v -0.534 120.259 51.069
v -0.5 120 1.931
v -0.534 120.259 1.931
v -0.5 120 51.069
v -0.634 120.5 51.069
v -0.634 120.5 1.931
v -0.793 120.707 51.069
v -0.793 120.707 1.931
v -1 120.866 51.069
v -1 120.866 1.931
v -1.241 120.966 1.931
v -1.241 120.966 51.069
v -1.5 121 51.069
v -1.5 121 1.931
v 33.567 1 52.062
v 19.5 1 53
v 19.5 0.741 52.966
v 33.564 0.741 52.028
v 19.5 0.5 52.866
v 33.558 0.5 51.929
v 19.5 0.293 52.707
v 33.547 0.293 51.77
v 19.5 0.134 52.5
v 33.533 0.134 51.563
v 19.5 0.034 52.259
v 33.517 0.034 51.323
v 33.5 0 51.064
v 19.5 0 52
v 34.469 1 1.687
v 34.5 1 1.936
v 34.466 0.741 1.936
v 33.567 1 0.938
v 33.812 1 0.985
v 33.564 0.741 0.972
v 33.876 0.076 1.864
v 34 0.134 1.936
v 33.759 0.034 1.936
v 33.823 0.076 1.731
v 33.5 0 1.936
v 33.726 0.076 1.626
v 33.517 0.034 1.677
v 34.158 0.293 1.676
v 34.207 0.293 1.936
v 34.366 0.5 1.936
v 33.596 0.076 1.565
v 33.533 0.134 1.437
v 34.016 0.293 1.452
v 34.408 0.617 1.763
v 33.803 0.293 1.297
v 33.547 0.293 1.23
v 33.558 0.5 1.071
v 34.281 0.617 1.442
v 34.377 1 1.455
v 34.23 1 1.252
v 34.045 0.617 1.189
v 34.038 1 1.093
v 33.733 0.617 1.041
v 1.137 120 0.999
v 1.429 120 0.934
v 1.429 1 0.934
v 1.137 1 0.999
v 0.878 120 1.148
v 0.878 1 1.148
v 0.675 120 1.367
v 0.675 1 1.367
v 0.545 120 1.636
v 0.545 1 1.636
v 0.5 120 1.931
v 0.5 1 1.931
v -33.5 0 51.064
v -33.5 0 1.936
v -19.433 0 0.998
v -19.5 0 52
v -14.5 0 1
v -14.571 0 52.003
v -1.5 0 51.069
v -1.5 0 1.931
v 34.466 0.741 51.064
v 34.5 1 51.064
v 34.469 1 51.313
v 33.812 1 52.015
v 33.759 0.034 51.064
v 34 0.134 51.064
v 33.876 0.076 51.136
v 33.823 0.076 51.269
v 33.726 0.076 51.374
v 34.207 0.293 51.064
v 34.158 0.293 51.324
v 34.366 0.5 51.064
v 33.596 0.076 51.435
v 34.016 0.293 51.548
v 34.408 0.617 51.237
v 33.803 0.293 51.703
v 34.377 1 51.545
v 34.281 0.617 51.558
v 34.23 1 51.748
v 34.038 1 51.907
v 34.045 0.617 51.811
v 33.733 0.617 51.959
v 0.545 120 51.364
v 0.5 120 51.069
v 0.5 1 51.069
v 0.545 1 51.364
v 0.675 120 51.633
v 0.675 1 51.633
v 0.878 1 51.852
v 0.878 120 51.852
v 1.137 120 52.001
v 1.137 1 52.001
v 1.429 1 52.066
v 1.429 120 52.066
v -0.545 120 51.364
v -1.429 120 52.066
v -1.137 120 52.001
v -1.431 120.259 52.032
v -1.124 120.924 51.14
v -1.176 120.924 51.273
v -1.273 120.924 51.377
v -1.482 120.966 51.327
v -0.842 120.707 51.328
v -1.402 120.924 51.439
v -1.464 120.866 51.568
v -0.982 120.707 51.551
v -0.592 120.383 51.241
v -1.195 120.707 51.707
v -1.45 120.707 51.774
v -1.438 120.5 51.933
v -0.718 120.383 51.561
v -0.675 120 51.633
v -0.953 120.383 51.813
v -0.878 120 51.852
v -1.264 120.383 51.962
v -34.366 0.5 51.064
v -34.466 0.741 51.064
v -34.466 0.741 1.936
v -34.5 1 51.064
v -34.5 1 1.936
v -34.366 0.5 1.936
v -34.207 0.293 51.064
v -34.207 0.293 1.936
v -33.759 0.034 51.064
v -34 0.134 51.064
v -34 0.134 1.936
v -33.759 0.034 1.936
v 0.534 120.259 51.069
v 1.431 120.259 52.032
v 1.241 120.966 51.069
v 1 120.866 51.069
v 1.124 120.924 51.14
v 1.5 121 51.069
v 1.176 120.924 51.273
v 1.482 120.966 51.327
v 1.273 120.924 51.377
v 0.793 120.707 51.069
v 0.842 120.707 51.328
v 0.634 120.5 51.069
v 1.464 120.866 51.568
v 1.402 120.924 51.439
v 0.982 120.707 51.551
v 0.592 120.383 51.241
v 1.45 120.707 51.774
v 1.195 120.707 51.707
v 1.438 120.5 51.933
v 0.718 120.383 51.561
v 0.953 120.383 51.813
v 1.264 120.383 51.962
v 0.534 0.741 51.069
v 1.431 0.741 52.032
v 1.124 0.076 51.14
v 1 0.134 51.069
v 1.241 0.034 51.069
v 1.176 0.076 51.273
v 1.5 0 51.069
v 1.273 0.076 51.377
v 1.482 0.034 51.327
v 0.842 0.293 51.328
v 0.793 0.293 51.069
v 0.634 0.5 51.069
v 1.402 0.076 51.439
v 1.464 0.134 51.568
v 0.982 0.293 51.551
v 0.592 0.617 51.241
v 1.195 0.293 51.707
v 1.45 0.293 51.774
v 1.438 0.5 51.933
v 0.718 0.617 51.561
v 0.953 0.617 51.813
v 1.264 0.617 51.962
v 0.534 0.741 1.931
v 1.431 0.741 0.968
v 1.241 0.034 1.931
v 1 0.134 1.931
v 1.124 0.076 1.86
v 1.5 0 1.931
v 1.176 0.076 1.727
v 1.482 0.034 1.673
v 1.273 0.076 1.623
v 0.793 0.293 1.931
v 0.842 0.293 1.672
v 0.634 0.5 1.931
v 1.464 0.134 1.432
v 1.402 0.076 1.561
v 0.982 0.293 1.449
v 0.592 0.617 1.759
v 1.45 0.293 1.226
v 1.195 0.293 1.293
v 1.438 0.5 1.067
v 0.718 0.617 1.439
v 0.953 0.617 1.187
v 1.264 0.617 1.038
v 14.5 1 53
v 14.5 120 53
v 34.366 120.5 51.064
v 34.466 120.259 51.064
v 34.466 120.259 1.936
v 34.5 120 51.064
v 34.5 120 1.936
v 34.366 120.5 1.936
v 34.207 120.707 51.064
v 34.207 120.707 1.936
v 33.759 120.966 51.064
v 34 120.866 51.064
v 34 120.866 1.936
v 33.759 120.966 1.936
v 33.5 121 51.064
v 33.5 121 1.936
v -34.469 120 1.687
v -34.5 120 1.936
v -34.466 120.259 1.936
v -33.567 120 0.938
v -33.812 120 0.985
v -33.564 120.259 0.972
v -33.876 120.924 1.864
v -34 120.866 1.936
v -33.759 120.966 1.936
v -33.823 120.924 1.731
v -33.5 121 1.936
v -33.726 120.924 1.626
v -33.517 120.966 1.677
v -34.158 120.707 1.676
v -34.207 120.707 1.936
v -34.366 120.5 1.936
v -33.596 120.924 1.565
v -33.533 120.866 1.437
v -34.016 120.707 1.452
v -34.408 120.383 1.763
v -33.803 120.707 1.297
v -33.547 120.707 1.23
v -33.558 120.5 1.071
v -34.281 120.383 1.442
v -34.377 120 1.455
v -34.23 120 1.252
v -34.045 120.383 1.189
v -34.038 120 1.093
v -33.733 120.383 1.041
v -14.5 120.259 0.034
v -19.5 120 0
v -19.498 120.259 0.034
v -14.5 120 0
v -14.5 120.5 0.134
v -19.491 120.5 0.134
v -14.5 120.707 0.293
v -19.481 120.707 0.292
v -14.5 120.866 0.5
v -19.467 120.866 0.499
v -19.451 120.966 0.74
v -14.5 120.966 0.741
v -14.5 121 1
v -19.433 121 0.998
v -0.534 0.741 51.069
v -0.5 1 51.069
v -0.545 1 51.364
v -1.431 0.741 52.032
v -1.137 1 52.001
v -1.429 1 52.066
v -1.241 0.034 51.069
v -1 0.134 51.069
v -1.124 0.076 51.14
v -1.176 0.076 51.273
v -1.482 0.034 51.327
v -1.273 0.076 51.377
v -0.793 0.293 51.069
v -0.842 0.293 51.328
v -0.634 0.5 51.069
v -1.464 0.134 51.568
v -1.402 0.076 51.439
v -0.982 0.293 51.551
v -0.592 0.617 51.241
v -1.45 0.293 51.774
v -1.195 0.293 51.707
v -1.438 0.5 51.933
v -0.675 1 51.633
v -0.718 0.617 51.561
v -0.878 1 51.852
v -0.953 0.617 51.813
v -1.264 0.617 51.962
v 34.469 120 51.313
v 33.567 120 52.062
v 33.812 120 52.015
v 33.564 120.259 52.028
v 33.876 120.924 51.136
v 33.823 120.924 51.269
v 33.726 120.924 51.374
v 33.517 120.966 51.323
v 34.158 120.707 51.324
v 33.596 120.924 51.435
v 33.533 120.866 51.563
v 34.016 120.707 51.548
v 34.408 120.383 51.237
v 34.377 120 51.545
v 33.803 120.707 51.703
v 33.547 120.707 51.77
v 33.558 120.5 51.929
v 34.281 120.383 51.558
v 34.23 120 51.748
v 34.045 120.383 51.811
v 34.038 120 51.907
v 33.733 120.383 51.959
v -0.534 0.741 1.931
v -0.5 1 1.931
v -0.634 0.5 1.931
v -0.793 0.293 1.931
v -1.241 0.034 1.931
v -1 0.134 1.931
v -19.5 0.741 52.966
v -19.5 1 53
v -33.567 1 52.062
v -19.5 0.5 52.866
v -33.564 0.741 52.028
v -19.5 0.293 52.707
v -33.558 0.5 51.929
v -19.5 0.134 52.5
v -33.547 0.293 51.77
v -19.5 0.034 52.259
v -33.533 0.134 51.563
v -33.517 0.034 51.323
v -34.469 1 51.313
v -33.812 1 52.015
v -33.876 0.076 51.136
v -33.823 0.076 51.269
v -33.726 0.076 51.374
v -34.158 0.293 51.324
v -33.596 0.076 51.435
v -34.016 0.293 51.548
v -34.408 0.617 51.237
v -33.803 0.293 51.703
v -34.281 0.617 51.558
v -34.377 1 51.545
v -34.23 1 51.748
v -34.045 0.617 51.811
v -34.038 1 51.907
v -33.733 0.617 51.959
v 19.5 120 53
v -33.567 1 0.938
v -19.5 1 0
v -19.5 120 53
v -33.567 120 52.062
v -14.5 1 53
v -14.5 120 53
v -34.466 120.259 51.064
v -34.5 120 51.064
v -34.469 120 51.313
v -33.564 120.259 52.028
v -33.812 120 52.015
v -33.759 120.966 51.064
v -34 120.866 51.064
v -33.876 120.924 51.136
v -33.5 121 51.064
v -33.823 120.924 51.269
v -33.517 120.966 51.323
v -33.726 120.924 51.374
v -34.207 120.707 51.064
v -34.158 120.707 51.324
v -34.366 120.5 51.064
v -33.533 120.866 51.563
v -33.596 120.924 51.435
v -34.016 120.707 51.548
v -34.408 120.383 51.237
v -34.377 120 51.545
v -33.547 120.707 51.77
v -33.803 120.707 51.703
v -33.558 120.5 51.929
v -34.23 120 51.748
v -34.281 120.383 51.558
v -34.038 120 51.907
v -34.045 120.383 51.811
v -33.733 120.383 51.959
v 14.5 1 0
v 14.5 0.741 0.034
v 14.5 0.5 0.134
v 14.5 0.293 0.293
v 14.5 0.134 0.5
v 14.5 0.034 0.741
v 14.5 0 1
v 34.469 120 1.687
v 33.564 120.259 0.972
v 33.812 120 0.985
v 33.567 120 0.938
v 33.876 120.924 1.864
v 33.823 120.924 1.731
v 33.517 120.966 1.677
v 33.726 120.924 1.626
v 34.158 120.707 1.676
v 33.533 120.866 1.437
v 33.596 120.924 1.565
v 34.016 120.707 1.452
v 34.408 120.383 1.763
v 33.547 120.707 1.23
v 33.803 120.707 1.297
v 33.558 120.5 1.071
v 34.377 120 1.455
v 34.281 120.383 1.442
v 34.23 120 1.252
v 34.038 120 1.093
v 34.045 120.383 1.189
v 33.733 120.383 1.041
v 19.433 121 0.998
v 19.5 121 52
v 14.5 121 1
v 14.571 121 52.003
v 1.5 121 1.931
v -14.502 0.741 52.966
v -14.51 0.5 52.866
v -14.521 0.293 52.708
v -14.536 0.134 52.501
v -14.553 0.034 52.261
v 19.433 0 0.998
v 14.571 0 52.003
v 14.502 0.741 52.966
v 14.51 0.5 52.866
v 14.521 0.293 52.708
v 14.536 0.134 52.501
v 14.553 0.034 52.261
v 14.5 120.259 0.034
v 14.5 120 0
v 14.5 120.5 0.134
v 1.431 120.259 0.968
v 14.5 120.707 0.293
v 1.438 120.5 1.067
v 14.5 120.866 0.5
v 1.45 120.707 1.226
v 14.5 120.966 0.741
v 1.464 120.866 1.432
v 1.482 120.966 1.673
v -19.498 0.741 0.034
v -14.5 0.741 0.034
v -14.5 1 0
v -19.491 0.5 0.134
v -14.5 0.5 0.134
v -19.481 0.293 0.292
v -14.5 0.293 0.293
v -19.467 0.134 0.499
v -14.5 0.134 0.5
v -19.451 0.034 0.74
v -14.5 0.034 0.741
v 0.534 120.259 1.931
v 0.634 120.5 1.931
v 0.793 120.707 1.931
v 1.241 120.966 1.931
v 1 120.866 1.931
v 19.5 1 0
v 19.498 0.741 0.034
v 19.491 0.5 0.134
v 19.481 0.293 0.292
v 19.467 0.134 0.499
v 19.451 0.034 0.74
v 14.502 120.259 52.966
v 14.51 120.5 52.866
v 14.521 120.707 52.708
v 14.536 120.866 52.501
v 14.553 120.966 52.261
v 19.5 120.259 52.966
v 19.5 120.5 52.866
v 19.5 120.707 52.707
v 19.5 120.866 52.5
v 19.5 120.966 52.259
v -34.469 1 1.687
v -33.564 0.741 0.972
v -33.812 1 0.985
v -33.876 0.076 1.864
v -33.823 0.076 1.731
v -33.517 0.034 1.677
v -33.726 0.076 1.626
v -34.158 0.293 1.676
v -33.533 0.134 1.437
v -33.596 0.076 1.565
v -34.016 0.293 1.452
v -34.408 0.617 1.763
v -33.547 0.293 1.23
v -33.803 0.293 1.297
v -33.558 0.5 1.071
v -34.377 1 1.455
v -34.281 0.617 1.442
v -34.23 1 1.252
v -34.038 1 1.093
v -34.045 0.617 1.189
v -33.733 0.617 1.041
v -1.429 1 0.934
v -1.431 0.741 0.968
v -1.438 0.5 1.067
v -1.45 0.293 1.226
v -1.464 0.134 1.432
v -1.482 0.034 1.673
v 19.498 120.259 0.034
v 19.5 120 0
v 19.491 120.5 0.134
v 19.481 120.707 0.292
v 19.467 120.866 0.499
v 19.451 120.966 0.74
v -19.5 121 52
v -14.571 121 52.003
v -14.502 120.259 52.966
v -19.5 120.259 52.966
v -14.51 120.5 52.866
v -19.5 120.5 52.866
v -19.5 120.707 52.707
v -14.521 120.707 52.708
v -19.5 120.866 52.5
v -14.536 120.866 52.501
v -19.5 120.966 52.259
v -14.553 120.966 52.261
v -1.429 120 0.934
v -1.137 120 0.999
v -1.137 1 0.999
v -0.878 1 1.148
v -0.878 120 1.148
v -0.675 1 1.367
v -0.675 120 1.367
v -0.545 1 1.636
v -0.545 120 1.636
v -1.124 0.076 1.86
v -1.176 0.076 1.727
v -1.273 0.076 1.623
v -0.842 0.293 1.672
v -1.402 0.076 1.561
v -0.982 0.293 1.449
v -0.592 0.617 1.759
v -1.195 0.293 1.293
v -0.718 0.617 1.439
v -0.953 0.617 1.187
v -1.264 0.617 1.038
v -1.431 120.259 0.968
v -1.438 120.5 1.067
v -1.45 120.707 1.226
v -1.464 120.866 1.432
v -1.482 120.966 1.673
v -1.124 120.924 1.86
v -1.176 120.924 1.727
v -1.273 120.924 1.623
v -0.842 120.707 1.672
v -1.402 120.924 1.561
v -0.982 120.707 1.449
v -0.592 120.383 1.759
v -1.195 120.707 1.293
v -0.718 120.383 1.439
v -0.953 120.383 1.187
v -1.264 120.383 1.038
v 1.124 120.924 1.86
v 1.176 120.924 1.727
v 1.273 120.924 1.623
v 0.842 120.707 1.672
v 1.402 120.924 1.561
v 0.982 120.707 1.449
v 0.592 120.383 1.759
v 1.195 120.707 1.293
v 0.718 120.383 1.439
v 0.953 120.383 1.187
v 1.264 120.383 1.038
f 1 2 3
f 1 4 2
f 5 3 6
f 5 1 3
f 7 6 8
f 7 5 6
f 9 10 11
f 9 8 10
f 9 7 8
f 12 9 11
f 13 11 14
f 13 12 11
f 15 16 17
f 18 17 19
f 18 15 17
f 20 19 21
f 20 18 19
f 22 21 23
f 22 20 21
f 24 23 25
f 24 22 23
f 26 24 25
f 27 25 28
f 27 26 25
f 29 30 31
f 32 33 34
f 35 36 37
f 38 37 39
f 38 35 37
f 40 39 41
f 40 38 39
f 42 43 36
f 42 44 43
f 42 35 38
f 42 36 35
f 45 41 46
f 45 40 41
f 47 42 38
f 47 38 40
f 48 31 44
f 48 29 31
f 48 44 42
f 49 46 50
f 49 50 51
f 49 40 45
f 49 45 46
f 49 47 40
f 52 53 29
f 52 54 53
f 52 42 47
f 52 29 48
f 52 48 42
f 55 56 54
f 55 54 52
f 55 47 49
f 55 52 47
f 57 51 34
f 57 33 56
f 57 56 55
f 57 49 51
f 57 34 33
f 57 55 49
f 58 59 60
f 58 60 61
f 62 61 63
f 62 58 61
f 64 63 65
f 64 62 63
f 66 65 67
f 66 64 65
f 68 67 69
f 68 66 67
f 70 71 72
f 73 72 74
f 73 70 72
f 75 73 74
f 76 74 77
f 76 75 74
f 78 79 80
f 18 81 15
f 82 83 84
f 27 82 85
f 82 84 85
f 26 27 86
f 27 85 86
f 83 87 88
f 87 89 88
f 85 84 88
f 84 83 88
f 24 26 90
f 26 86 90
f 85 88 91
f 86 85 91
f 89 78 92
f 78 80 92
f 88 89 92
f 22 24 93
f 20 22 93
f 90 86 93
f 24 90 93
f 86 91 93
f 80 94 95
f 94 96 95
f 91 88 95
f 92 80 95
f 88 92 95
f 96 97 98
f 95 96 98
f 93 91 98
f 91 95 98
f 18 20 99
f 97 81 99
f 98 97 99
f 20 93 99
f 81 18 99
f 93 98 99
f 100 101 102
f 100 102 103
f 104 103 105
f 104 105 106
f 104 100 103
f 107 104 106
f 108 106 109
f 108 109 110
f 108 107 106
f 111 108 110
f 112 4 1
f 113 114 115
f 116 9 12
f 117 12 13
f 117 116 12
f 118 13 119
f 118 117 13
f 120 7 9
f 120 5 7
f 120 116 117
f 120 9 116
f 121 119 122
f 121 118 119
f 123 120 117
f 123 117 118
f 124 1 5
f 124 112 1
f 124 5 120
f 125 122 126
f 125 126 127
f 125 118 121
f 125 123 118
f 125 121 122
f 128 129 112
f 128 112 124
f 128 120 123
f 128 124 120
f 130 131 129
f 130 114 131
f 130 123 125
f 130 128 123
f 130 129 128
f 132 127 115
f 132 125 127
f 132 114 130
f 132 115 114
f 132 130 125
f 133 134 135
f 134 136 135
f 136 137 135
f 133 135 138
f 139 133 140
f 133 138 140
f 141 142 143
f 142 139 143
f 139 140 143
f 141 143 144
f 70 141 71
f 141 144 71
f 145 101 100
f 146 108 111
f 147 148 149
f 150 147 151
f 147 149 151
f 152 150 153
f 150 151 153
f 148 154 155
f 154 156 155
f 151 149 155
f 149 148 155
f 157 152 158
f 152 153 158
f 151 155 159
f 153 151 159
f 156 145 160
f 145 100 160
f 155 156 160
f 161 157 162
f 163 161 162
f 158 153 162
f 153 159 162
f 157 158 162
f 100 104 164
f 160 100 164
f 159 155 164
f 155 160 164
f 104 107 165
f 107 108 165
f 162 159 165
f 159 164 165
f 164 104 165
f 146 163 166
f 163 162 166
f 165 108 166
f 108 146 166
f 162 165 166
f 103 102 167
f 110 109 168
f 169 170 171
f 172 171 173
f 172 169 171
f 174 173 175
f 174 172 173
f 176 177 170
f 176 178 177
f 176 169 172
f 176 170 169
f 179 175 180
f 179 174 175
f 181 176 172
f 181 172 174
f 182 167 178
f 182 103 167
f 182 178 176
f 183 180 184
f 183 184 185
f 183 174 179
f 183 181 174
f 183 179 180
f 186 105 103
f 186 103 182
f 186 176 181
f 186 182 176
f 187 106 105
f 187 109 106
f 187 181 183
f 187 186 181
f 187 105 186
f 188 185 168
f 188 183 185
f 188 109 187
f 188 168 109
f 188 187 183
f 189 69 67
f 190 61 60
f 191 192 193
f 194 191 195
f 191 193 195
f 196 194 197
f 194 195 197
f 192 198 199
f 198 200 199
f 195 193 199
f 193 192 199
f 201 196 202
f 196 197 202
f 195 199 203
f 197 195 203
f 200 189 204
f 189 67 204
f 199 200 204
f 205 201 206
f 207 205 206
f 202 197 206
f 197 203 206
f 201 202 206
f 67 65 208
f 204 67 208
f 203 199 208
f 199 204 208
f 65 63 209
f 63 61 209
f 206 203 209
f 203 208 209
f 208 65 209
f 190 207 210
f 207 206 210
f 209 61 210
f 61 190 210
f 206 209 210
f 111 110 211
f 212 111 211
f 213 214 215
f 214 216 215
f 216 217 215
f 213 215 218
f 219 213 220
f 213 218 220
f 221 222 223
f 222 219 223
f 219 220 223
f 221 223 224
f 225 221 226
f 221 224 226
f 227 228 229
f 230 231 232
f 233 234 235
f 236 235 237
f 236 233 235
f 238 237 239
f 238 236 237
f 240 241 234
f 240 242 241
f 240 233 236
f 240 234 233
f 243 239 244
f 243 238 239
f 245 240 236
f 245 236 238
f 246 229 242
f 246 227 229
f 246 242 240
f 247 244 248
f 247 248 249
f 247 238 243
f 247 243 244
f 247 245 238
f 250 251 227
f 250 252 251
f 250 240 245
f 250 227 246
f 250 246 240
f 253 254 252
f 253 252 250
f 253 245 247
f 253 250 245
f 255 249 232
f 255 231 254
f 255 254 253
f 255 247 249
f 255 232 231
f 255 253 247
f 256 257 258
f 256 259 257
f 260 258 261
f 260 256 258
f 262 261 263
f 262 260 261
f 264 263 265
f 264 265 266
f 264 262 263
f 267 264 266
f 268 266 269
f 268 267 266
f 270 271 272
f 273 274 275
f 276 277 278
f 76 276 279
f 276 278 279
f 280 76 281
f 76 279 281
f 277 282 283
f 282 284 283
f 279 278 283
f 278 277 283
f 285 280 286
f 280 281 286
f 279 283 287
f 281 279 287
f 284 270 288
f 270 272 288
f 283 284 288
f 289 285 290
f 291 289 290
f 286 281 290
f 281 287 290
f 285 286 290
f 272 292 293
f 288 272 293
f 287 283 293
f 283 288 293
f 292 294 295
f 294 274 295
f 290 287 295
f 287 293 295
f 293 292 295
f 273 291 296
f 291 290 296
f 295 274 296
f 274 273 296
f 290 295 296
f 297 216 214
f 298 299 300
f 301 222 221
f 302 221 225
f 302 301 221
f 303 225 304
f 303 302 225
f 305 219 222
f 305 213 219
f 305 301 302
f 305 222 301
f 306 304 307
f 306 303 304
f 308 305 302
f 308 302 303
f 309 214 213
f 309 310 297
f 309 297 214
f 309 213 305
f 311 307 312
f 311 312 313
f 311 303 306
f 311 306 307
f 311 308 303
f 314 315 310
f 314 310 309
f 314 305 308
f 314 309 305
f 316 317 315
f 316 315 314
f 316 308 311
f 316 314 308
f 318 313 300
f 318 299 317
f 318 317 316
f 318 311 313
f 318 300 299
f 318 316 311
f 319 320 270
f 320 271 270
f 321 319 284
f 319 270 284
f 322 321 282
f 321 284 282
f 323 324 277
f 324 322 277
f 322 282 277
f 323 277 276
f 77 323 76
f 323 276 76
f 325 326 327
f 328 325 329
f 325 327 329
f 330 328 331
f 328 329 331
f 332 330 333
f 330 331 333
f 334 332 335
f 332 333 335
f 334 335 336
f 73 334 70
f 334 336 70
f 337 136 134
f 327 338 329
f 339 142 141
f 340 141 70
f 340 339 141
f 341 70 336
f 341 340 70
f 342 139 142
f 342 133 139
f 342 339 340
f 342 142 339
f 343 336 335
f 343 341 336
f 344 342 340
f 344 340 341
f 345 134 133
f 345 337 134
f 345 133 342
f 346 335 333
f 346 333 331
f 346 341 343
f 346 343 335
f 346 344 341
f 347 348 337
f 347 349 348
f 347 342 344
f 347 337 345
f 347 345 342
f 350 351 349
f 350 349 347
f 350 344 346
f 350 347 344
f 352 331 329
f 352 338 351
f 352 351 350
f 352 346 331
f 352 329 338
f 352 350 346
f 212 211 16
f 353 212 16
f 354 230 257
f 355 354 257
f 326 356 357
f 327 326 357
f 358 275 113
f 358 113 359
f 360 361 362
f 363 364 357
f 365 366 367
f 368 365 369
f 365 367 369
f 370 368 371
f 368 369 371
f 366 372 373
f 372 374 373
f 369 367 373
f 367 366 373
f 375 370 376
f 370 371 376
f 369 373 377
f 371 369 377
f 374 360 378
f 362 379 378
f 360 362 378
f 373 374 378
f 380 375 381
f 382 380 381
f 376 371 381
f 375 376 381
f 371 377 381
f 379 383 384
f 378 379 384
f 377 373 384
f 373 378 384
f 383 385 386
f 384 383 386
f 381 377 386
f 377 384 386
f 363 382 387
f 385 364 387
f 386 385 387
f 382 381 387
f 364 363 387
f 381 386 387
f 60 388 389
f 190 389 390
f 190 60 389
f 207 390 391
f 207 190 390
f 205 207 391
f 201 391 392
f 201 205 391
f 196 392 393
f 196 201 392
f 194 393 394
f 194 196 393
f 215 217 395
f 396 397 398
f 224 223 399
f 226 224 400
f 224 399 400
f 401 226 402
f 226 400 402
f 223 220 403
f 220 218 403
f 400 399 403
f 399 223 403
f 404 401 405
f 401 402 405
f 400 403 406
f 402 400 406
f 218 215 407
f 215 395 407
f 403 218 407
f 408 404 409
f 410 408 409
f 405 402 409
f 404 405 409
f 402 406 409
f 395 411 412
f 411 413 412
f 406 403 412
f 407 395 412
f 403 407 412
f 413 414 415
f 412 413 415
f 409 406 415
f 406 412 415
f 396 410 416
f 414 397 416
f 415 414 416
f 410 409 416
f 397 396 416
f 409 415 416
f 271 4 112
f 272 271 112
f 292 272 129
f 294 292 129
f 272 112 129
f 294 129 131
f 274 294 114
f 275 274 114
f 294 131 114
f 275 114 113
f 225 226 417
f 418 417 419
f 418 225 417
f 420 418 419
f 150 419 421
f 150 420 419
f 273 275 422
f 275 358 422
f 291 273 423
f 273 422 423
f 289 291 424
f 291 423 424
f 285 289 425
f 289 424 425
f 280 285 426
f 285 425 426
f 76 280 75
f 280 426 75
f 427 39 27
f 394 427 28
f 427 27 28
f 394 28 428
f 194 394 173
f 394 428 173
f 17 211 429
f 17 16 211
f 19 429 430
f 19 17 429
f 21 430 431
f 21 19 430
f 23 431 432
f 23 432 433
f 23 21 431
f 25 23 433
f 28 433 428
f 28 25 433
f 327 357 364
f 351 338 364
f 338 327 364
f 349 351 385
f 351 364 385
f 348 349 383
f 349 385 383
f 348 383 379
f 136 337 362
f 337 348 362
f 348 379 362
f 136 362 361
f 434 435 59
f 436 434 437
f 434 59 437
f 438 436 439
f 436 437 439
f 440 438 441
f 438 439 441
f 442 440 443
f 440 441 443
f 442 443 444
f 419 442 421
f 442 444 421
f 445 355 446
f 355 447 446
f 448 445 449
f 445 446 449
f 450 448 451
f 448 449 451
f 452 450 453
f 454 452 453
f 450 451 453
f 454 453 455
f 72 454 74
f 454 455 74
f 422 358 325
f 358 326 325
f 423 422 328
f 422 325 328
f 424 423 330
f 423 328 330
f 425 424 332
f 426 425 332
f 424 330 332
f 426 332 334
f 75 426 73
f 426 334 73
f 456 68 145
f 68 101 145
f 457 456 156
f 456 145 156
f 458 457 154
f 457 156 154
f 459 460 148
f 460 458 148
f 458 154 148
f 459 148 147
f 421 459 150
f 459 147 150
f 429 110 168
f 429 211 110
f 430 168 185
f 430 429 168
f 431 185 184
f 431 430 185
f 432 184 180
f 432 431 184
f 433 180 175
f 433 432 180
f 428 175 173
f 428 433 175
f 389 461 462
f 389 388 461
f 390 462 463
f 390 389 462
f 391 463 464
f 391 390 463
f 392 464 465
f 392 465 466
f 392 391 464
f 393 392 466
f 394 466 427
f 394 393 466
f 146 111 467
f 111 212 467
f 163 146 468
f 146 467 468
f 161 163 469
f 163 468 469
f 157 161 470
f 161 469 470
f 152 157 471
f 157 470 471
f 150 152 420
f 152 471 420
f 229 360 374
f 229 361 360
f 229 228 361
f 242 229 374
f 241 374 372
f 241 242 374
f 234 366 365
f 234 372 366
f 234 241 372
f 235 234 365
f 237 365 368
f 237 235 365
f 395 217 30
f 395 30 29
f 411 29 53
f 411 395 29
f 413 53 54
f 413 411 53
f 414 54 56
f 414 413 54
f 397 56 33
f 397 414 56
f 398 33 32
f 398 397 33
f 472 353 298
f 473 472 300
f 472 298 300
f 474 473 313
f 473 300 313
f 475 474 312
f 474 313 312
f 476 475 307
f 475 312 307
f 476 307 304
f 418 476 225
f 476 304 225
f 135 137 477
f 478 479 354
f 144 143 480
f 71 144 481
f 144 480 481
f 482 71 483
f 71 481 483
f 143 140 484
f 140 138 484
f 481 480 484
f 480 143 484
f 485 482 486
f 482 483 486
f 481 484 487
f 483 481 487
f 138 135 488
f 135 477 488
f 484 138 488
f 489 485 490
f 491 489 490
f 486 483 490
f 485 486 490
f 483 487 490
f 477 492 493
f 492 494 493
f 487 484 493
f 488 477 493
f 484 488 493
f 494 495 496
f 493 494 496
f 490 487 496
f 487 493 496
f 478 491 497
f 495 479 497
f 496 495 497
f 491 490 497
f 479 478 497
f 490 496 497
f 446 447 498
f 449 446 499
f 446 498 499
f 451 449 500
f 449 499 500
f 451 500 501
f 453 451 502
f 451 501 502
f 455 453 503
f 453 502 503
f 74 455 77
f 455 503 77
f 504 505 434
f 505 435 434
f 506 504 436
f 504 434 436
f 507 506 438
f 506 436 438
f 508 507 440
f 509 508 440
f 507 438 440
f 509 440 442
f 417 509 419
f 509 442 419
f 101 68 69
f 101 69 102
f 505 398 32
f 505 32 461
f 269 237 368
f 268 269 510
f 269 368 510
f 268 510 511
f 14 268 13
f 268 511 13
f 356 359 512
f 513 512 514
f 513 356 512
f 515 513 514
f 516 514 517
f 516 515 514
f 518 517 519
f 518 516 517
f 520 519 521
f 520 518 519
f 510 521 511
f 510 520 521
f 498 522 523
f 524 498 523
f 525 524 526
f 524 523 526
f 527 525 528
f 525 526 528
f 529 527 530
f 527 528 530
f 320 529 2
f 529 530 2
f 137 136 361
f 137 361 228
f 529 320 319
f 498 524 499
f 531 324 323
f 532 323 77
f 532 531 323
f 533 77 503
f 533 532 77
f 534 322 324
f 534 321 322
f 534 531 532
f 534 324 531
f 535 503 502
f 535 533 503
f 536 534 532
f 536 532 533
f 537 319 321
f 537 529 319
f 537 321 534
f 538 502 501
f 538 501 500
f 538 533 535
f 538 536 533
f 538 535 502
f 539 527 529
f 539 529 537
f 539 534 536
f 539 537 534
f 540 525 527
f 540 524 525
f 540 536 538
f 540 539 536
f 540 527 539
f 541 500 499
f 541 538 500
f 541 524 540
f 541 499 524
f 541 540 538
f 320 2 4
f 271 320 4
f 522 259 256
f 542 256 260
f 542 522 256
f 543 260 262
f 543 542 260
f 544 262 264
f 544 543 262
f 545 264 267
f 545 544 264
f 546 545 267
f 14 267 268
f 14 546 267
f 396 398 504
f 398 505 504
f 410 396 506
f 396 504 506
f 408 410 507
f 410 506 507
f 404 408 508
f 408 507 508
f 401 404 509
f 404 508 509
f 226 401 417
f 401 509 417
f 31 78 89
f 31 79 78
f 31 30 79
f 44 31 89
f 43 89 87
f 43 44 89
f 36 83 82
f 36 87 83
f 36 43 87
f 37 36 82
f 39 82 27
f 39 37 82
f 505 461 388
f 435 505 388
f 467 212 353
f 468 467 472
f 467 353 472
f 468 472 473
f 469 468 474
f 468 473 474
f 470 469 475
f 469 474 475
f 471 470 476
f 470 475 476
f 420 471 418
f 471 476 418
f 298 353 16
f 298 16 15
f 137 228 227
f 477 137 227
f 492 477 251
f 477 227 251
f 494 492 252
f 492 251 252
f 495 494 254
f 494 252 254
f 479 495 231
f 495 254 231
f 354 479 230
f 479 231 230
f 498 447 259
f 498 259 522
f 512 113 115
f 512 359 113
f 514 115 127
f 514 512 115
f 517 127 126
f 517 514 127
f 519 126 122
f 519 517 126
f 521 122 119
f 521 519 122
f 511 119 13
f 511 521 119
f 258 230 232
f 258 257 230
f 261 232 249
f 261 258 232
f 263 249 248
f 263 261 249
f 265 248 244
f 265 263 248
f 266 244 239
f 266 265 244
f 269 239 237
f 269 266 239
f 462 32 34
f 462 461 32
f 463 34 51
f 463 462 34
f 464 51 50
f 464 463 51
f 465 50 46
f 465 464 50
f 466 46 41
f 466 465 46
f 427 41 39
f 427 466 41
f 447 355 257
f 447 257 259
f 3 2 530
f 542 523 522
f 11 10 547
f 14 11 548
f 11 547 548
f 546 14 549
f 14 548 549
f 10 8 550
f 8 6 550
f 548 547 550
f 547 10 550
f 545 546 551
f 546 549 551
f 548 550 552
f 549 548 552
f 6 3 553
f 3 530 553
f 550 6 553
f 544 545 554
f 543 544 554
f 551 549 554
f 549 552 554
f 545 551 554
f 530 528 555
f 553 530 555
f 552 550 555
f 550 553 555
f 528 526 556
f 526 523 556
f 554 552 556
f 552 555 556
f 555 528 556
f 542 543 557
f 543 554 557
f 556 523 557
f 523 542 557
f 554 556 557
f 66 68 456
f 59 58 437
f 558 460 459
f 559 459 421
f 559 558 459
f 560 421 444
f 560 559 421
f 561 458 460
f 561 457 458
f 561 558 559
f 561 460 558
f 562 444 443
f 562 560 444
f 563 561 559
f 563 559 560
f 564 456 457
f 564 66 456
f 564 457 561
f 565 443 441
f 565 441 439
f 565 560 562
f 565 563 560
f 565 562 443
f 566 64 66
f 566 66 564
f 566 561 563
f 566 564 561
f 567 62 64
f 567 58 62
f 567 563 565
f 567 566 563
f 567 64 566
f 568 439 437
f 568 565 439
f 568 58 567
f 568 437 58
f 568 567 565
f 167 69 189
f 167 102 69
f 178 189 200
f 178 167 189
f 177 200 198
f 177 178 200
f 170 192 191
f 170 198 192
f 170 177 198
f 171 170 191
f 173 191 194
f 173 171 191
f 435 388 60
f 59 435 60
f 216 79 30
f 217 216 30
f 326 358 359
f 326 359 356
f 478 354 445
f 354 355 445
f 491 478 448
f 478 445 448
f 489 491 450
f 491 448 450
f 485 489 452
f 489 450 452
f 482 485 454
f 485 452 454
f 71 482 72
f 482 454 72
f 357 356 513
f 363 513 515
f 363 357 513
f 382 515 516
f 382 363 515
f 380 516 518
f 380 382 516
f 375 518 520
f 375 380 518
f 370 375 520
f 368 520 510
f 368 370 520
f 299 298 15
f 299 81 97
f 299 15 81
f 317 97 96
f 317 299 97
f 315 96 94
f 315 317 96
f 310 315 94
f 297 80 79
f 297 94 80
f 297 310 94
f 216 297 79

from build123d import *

# Parameters (mm, degrees)
F1_DEPTH = 121
F2_R     = 1


with BuildPart() as f1:
    # F0 (on Front) → F1 (new body)
    with BuildSketch(Plane.XZ):
        Polygon((-19.5, 53), (-34.5, 52), (-34.5, 1), (-19.5, 0), (-14.5, 0), (-0.5, 1), (-0.5, 52), (-14.5, 53), align=None)
    extrude(amount=-F1_DEPTH)

    # F2
    f2_edges = [f1.edges().sort_by_distance(p)[0] for p in [
        (-0.5, 60.5, 1),
        (-0.5, 60.5, 52),
        (-0.5, 0, 26.5),
        (-0.5, 121, 26.5),
        (-34.5, 60.5, 52),
        (-34.5, 60.5, 1),
        (-34.5, 0, 26.5),
        (-34.5, 121, 26.5),
        (-27, 0, 52.5),
        (-27, 0, 0.5),
        (-17, 0, 0),
        (-7.5, 0, 0.5),
        (-7.5, 0, 52.5),
        (-17, 0, 53),
        (-27, 121, 52.5),
        (-27, 121, 0.5),
        (-17, 121, 0),
        (-7.5, 121, 0.5),
        (-7.5, 121, 52.5),
        (-17, 121, 53),
    ]]
    fillet(f2_edges, radius=F2_R)


with BuildPart() as f3_1:
    # F3: instance of F1
    add(f1.part.mirror(Plane.YZ))


solid = Compound([f1.part, f3_1.part])
